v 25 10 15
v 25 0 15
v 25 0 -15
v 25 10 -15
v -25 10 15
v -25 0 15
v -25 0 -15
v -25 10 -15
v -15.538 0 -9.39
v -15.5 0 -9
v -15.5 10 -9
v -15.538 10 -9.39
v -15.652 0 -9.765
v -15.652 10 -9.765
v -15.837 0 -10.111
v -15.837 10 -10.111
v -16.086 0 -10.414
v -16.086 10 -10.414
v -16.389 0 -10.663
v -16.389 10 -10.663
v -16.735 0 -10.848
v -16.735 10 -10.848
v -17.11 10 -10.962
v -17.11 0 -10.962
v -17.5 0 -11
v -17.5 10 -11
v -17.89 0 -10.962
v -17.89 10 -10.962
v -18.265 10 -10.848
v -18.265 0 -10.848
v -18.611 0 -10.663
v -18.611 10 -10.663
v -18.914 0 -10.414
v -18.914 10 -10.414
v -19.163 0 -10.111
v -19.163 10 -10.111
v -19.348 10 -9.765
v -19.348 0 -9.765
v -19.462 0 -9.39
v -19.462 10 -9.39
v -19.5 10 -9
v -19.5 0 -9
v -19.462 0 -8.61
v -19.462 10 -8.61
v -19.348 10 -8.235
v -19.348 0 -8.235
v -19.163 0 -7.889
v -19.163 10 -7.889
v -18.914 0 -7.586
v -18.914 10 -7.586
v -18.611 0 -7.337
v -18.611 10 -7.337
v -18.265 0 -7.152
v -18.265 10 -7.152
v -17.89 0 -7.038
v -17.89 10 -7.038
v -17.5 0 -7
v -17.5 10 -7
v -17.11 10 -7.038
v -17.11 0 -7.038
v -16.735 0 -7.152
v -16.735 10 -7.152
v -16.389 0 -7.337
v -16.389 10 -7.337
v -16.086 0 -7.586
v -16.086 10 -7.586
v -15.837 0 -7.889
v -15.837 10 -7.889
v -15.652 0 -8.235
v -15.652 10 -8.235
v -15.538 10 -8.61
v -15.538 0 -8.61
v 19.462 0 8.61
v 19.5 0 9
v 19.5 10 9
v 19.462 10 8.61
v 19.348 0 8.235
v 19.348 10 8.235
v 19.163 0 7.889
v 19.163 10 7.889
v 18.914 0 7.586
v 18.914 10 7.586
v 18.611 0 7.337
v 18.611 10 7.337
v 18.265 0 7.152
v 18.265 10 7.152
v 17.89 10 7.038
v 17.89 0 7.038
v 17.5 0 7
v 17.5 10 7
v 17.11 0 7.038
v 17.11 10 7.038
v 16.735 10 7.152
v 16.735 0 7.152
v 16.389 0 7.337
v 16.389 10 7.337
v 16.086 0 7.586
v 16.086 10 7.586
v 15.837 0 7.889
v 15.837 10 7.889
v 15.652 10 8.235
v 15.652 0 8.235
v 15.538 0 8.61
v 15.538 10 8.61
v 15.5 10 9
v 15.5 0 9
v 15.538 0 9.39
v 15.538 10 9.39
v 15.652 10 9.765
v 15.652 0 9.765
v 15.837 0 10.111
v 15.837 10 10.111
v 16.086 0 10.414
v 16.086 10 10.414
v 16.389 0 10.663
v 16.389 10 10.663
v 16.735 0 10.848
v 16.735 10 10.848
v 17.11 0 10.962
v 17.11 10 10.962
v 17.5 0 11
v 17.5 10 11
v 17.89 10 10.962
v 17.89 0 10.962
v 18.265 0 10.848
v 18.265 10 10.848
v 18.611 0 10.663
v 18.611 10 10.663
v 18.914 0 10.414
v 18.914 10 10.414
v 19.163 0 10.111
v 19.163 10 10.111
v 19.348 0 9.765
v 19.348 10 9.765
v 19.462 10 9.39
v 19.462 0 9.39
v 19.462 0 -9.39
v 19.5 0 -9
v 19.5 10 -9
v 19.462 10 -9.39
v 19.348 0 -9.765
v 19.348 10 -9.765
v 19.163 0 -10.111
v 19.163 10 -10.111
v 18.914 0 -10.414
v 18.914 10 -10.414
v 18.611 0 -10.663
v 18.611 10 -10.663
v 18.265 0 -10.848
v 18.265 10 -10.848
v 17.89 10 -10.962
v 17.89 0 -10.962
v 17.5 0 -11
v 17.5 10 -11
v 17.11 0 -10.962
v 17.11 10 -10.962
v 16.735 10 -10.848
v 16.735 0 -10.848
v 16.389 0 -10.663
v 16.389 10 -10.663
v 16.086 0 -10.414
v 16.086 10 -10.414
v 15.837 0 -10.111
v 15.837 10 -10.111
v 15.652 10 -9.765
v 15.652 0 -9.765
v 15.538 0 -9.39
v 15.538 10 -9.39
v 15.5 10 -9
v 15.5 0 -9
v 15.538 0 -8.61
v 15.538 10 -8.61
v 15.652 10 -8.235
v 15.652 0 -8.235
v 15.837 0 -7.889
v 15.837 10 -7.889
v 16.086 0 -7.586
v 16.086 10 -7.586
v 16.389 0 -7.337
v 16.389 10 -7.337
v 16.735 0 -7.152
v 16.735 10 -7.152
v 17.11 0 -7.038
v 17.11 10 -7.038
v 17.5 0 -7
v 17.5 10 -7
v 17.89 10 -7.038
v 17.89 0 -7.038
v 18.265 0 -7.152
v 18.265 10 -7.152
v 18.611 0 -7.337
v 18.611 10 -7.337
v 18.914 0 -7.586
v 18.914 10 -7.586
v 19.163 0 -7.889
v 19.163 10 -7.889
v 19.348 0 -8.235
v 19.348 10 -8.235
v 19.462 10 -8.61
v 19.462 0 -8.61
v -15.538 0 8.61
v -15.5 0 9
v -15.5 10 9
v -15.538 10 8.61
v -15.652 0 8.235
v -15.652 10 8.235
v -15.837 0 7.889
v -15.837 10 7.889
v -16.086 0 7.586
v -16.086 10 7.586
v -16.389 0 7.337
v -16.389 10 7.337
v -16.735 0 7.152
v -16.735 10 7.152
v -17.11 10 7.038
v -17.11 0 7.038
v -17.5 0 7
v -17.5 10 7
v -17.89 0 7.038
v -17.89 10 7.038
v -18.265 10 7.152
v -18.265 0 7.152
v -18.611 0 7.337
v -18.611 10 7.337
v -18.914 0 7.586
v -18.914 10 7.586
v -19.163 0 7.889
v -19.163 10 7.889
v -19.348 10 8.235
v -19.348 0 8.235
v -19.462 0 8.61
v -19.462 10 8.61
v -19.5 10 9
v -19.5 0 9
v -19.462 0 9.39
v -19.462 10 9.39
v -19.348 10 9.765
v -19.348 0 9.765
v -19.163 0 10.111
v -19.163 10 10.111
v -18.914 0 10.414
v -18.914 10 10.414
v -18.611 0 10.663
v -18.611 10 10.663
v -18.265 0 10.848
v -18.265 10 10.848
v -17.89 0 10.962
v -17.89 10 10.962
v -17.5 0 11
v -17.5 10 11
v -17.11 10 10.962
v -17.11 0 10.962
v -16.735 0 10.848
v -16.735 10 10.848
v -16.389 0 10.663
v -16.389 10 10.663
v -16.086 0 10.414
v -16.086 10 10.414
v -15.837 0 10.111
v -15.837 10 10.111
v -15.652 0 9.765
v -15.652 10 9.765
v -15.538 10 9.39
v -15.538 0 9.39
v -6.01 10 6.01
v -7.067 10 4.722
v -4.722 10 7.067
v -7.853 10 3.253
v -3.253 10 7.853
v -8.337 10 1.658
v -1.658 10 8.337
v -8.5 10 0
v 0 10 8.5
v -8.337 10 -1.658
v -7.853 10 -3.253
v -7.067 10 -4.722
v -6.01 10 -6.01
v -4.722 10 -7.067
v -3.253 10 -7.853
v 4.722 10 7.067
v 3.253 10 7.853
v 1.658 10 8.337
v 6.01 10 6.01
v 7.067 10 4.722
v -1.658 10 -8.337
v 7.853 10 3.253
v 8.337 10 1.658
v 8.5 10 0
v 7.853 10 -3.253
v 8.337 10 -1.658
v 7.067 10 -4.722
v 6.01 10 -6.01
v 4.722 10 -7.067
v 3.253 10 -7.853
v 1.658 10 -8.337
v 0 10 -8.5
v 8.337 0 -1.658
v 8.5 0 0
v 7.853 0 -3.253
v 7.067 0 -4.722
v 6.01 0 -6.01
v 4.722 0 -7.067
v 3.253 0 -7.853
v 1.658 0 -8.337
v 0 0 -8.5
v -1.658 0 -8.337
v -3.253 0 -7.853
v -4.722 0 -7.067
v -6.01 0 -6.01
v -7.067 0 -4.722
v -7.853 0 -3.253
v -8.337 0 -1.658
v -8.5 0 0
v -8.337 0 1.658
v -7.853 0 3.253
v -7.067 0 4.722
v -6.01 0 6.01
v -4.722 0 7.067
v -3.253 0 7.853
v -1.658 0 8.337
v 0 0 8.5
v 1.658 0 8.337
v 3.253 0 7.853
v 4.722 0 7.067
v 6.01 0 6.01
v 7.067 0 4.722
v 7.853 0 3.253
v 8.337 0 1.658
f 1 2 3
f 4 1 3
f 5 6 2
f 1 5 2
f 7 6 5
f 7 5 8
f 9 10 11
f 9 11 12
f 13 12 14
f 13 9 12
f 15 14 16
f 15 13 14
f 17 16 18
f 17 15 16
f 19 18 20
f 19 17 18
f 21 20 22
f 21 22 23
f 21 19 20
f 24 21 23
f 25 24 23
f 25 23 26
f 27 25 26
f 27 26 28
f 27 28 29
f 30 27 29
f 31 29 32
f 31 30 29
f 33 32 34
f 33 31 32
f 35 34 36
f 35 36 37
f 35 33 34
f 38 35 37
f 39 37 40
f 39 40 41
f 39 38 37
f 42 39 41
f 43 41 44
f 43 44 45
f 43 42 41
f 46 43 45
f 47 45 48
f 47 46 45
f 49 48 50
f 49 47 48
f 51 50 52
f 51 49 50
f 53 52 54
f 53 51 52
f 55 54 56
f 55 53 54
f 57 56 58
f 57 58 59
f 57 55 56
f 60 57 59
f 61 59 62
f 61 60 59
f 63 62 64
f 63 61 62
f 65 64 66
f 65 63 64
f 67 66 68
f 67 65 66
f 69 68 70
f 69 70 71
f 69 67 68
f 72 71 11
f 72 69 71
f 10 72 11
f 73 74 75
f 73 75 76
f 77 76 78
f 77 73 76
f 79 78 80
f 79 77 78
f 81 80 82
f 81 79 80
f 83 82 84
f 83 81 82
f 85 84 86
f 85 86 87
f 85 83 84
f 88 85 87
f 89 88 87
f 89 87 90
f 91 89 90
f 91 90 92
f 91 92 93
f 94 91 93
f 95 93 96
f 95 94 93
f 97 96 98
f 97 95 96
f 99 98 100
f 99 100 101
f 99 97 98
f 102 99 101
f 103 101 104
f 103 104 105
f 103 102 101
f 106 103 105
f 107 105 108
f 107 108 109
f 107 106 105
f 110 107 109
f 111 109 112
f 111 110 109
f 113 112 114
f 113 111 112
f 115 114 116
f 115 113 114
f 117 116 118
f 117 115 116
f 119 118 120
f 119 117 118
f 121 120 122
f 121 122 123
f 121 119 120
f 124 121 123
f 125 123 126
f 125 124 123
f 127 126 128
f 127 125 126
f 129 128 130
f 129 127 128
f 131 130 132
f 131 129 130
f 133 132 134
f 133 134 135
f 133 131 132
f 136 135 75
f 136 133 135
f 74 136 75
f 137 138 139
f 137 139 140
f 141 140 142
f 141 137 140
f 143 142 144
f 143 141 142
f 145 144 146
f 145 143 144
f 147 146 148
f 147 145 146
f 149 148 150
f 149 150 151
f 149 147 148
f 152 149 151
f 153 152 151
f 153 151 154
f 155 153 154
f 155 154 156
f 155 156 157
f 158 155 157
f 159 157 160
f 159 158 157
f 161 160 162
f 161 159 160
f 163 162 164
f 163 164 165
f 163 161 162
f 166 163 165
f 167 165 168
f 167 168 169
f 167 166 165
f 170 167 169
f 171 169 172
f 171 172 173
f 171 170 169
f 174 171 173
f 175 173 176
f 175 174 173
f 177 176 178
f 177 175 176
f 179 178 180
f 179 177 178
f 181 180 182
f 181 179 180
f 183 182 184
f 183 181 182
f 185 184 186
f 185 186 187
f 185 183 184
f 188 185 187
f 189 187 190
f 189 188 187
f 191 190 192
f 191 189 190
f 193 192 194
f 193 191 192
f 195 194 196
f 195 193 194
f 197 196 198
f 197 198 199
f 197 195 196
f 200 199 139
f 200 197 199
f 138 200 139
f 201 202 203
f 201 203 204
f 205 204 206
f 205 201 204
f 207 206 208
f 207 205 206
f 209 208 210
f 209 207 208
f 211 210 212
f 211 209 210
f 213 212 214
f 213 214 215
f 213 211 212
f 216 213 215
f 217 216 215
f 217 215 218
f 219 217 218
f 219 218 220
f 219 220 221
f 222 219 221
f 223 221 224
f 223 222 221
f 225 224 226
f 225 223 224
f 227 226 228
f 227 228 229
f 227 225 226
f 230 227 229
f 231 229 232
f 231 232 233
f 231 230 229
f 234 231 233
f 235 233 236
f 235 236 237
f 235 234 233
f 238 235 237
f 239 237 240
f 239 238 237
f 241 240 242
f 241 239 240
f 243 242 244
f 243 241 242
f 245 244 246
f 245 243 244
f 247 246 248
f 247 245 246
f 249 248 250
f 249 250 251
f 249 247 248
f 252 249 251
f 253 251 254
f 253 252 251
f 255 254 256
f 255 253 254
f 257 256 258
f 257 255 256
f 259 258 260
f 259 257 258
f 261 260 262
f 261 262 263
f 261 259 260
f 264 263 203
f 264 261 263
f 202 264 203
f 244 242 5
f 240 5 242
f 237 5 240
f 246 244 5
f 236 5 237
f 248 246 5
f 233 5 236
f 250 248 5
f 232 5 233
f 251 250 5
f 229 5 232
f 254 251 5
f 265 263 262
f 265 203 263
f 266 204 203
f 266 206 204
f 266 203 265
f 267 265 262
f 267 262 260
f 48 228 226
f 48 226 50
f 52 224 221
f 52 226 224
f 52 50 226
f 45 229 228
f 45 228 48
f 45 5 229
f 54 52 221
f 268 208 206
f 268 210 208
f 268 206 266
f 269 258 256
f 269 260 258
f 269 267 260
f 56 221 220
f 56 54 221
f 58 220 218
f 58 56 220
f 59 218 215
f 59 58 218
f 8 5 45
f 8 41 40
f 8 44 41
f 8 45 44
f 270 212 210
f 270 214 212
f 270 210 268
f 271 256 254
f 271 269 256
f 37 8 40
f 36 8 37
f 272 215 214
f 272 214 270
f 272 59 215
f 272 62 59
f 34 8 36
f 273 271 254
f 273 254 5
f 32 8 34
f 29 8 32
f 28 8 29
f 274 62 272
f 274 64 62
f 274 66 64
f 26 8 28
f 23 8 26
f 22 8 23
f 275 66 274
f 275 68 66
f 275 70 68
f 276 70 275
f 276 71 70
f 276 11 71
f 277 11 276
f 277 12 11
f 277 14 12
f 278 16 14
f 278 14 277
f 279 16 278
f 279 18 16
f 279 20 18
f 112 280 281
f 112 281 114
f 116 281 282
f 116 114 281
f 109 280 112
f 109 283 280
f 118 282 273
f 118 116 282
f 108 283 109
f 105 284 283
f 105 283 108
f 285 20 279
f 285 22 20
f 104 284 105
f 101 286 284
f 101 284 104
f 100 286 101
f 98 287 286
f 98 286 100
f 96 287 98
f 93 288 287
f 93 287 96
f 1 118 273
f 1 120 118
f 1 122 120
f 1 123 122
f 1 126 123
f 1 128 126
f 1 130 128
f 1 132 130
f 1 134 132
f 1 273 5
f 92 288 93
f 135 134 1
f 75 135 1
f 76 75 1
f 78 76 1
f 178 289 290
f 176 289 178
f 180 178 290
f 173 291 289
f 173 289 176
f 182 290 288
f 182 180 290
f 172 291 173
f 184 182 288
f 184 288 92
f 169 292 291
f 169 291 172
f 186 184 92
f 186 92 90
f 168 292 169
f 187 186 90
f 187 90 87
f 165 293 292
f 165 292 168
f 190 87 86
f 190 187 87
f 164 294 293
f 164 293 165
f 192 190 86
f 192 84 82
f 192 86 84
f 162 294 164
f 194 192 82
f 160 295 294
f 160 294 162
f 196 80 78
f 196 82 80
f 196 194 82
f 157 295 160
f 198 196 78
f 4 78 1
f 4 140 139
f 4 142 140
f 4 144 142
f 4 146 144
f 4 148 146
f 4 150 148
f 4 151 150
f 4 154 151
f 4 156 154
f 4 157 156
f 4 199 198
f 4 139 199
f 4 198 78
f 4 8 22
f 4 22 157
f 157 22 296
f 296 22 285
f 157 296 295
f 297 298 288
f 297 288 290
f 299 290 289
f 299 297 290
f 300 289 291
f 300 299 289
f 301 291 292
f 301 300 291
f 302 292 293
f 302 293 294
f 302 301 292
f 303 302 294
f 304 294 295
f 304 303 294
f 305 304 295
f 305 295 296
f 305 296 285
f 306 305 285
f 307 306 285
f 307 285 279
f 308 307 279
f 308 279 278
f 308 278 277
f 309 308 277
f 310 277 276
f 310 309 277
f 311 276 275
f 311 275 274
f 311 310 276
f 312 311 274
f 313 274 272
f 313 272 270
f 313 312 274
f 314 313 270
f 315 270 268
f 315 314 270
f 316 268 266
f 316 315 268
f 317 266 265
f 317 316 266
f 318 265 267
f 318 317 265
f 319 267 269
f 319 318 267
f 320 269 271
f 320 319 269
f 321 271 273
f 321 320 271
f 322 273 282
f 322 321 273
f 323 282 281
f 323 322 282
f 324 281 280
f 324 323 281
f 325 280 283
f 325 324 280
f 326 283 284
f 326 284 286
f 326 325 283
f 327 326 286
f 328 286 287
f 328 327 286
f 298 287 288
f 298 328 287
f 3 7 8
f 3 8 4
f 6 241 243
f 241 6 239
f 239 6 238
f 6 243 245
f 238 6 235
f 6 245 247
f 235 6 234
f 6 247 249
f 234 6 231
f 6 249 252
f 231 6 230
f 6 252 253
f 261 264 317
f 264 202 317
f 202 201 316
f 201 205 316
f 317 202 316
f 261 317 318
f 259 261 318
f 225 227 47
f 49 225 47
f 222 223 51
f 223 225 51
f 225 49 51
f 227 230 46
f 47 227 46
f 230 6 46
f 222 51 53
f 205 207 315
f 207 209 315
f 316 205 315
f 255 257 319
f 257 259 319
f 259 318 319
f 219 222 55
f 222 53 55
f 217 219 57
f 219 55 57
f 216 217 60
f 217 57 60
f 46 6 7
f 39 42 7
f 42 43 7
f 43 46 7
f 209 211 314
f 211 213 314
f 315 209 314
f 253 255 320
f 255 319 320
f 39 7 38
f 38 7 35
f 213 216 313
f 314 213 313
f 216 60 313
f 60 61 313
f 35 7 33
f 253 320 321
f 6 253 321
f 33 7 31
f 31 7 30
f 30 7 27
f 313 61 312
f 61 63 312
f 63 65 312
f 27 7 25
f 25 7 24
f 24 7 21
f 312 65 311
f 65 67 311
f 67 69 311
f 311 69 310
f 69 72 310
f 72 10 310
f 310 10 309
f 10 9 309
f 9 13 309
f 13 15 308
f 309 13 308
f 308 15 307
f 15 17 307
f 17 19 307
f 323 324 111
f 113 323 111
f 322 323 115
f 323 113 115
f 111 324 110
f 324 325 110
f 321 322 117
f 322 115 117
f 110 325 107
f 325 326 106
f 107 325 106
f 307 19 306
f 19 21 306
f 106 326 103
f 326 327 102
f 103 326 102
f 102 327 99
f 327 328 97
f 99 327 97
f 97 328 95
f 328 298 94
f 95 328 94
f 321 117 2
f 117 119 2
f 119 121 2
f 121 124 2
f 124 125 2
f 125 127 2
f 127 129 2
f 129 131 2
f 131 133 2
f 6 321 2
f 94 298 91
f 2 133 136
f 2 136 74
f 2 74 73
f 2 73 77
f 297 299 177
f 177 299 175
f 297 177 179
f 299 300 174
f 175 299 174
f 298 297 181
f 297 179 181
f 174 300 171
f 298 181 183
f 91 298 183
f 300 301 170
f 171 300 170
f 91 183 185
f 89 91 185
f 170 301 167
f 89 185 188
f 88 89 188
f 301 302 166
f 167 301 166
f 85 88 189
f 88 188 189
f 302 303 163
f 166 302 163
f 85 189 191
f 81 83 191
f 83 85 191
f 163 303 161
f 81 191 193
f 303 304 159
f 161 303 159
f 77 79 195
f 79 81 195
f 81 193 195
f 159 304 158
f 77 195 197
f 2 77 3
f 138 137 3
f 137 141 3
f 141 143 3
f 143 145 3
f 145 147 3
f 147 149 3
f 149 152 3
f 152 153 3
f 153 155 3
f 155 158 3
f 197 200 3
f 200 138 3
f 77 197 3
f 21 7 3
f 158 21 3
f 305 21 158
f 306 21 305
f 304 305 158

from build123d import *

# Parameters (mm, degrees)
SKETCH1_W           = 50
SKETCH1_H           = 30
SKETCH1_R           = 8.5
SKETCH1_R_2         = 2
BOSS_EXTRUDE1_DEPTH = 10


with BuildPart() as part:
    # Sketch1 → Boss-Extrude1 (new body)
    with BuildSketch(Plane(origin=(0, 0, 0), x_dir=(1, 0, 0), z_dir=(0, 1, 0))):
        Rectangle(SKETCH1_W, SKETCH1_H)
        Circle(SKETCH1_R, mode=Mode.SUBTRACT)
        with Locations((-17.5, 9)):
            Circle(SKETCH1_R_2, mode=Mode.SUBTRACT)
        with Locations((17.5, 9)):
            Circle(SKETCH1_R_2, mode=Mode.SUBTRACT)
        with Locations((17.5, -9)):
            Circle(SKETCH1_R_2, mode=Mode.SUBTRACT)
        with Locations((-17.5, -9)):
            Circle(SKETCH1_R_2, mode=Mode.SUBTRACT)
    extrude(amount=BOSS_EXTRUDE1_DEPTH)


solid = part.part
